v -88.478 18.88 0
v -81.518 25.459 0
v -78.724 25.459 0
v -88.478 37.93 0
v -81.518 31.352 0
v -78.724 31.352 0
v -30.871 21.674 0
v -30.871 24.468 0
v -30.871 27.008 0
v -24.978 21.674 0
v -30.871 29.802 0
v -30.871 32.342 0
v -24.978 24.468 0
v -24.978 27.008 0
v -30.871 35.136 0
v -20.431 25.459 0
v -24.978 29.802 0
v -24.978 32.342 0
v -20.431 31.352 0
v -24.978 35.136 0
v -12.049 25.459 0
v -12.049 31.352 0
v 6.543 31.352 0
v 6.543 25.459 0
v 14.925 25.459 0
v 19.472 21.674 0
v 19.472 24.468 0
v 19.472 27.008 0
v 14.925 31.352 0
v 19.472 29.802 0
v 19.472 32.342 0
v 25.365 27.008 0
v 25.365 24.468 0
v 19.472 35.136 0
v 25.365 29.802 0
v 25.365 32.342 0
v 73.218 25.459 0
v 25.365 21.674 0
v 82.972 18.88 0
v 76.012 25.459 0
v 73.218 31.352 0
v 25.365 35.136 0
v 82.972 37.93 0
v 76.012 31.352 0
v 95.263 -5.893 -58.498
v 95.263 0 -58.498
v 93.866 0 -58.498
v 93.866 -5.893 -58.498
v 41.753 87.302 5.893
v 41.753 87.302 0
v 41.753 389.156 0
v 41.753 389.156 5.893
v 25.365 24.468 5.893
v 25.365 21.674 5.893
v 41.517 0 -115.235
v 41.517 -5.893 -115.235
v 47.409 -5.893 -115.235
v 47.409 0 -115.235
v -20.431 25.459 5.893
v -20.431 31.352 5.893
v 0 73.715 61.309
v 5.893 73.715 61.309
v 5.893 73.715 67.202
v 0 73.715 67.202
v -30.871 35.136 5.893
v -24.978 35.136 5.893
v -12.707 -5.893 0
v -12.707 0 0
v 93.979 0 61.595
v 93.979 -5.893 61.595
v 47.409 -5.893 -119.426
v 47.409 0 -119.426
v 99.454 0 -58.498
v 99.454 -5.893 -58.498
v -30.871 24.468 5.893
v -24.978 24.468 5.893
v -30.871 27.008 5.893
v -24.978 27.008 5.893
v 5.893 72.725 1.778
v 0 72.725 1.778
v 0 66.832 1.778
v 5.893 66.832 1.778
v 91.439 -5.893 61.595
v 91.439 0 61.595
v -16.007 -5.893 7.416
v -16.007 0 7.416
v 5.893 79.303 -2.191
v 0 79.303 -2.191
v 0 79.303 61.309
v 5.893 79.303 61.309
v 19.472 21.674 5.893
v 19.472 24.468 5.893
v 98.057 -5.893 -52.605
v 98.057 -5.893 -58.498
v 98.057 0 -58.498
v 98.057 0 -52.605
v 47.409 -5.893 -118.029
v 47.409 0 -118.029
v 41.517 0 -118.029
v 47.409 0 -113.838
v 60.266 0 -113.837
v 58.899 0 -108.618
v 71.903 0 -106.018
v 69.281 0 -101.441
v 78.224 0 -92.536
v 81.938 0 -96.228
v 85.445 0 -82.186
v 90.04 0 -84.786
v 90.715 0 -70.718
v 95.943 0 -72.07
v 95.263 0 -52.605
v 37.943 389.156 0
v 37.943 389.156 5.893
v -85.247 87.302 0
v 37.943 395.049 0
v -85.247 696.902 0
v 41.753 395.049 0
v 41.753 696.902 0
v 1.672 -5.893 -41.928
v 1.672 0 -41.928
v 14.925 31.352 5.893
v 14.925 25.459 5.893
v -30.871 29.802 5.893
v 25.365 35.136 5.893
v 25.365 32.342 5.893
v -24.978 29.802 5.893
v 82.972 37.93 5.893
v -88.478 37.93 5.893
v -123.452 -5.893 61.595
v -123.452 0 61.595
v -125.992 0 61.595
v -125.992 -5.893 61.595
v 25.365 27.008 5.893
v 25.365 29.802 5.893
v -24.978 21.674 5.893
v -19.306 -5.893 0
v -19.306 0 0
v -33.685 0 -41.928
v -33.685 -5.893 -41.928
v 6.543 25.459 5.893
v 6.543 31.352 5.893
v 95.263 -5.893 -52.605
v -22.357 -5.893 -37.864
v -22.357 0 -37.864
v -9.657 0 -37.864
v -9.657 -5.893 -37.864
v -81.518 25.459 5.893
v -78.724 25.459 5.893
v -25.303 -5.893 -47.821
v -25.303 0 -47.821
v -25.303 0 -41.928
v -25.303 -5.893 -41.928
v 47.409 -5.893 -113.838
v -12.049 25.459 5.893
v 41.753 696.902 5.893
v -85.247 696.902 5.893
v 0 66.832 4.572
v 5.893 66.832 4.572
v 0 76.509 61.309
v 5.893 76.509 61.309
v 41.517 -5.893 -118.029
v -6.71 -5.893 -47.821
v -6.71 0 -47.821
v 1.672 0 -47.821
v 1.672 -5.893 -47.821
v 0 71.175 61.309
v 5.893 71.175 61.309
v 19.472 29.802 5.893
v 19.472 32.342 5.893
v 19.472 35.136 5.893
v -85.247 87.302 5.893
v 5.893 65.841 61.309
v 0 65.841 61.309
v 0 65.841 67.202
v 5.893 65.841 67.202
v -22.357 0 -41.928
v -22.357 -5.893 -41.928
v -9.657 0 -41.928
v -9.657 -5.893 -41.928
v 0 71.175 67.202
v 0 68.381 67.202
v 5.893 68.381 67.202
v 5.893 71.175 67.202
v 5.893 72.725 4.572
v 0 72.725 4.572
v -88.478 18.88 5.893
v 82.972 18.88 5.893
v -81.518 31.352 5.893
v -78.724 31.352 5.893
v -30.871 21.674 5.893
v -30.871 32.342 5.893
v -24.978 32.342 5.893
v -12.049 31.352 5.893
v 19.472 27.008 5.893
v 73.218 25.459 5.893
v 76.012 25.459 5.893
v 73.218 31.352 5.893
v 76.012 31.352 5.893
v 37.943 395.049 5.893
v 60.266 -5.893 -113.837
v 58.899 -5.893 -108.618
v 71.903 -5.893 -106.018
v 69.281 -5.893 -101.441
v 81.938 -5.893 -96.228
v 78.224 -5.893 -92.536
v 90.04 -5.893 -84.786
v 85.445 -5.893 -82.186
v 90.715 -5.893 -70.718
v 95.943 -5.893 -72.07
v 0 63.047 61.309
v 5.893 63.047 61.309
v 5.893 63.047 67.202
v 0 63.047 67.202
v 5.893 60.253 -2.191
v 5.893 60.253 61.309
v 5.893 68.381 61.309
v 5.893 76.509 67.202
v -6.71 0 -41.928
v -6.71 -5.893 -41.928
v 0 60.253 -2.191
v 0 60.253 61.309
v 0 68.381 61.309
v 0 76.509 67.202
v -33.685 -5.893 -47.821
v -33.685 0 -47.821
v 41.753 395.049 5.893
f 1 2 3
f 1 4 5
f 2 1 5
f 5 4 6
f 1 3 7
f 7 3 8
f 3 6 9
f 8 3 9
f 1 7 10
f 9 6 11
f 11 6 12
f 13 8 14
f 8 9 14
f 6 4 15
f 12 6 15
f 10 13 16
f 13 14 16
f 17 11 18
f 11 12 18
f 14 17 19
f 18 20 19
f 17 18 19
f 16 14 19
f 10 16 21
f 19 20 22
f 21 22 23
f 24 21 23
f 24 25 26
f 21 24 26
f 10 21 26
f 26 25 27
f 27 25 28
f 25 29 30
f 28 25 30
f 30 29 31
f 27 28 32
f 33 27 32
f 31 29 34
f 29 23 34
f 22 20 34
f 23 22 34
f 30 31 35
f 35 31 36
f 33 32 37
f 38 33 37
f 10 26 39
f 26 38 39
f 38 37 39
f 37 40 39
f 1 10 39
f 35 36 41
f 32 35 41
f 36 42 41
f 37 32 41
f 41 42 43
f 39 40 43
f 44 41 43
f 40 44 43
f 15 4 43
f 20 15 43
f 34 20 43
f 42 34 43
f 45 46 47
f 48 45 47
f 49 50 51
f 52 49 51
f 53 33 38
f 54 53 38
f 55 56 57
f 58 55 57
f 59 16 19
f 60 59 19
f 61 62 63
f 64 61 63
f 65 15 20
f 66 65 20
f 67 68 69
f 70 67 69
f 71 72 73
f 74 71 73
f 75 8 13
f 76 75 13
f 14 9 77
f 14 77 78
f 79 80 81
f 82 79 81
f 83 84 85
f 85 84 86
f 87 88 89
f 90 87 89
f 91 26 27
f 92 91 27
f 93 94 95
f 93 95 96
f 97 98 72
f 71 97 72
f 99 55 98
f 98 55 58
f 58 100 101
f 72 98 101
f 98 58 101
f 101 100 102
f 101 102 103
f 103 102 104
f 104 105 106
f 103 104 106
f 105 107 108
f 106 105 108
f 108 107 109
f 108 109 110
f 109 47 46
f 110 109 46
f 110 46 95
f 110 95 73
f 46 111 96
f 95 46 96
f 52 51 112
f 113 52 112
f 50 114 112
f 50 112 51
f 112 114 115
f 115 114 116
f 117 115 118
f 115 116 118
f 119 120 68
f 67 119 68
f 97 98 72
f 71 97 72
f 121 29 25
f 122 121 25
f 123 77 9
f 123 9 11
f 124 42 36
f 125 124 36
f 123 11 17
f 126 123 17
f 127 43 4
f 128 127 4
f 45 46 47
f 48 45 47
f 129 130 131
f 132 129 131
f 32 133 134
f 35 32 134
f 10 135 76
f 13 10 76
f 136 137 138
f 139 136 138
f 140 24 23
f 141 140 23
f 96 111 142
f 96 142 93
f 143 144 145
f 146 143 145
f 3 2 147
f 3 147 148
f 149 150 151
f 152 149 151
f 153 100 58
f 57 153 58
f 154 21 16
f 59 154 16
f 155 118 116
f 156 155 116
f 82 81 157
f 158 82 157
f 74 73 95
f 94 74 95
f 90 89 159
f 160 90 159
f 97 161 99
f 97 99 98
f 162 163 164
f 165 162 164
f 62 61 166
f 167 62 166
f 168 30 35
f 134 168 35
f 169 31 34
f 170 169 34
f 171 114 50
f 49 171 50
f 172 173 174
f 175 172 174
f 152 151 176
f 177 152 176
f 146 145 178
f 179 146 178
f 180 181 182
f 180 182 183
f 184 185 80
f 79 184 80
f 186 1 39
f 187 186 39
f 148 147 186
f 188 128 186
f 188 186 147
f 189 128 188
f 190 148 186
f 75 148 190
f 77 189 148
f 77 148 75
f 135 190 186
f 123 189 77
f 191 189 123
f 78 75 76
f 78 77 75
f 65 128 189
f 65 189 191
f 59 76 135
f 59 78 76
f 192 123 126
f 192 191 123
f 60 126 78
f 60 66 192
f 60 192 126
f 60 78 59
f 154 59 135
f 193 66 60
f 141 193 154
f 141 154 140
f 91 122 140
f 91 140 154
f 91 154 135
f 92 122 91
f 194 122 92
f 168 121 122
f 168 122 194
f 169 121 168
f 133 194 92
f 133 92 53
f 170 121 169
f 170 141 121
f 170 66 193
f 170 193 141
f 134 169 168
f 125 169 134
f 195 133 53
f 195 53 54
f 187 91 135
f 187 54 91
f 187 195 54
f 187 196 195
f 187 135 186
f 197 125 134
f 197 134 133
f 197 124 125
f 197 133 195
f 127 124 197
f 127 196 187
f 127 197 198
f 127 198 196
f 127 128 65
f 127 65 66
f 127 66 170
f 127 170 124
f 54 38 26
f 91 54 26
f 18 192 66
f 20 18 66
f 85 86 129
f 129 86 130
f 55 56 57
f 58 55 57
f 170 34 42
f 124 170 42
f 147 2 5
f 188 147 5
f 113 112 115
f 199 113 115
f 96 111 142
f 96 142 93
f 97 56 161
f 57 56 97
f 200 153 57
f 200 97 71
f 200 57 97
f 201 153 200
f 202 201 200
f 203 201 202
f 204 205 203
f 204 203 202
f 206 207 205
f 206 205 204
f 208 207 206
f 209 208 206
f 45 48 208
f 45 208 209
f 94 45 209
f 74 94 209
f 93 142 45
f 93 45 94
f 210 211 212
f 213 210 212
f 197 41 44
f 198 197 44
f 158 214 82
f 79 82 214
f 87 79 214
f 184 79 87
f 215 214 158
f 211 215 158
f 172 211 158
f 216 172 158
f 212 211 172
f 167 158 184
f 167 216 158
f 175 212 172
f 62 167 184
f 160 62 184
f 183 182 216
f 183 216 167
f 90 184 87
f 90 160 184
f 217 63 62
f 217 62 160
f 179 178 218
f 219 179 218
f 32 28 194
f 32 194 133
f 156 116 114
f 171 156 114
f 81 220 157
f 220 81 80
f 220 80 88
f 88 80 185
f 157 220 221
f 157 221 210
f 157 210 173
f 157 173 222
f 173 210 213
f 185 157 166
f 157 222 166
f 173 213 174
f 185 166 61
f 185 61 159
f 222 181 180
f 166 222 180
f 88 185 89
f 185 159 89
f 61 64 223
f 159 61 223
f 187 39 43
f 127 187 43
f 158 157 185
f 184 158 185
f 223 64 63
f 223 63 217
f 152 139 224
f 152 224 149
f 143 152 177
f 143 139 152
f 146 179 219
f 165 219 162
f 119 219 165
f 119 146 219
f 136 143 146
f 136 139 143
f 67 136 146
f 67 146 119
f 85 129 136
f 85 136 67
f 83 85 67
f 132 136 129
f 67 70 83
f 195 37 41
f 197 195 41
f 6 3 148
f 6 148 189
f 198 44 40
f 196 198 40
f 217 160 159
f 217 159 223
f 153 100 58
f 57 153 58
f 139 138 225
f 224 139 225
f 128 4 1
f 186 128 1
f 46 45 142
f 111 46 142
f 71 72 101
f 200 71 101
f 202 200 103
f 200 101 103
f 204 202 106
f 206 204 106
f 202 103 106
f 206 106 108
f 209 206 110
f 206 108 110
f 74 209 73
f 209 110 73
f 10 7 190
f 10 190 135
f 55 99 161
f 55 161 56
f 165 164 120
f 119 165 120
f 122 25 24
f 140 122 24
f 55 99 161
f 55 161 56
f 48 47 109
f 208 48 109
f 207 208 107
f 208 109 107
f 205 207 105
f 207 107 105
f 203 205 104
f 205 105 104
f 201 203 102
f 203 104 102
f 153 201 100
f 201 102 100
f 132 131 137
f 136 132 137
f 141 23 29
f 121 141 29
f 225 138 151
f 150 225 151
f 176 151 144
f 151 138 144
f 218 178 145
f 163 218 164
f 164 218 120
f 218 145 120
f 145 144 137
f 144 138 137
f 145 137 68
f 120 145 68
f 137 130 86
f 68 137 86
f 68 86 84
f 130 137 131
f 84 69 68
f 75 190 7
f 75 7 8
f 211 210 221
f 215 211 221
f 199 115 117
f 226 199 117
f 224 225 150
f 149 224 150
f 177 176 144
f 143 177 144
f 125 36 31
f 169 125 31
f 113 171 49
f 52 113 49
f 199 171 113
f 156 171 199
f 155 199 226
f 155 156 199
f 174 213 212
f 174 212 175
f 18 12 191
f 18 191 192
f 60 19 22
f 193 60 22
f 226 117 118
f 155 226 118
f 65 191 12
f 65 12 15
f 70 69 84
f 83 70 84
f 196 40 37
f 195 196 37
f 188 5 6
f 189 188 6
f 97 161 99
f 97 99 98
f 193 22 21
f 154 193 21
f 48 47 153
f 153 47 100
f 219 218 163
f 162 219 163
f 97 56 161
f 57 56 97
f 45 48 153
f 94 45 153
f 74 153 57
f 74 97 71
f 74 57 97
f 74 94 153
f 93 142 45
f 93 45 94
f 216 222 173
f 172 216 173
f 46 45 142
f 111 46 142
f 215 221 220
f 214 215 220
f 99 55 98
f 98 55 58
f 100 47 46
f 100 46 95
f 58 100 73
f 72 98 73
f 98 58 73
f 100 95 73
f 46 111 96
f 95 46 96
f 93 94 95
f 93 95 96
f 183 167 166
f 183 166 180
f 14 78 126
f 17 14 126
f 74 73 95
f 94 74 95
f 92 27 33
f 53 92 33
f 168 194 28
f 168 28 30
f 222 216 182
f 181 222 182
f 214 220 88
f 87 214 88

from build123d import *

# Parameters (mm, degrees)
F1_W      = 5.8928
F1_H      = 2.794
F1_W_2    = 2.794
F1_H_2    = 5.8928
F2_DEPTH  = 5.8928
F3_W      = 2.794
F3_H      = 12.9595901101
F3_W_2    = 2.54
F3_H_2    = 5.8928
F4_DEPTH  = 5.8928
F5_W      = 2.794
F5_H      = 5.8928
F5_W_2    = 5.8928
F5_H_2    = 2.794
F6_DEPTH  = 5.8928
F7_W      = 2.794
F7_H      = 5.8928
F7_W_2    = 5.8928
F7_H_2    = 2.794
F8_DEPTH  = 5.8928
F10_DEPTH = 5.8928
F13_DEPTH = 5.8928


# Not quite as in the source:
# - a variable given as a bare number and used for a length is read in inches; the dataset says mm whatever the document's units were


with BuildPart() as f2:
    # F1 (on Top) → F2 (new body)
    with BuildSketch(Plane.XY):
        Polygon((22.4183307789, 37.9304943726), (10.7343307789, 37.9304943726), (10.7343307789, 31.3518943726), (14.9253307789, 31.3518943726), (14.9253307789, 25.4590943726), (10.7343307789, 25.4590943726), (10.7343307789, 18.8804943726), (22.4183307789, 18.8804943726), (74.6153307789, 18.8804943726), (74.6153307789, 25.4590943726), (73.2183307789, 25.4590943726), (73.2183307789, 31.3518943726), (74.6153307789, 31.3518943726), (74.6153307789, 37.9304943726), align=None)
        Polygon((25.3647307789, 21.6744943726), (22.4183307789, 21.6744943726), (19.4719307789, 21.6744943726), (19.4719307789, 24.4684943726), (25.3647307789, 24.4684943726), align=None, mode=Mode.SUBTRACT)
        with Locations((22.4183307789, 28.4054943726)):
            Rectangle(F1_W, F1_H, mode=Mode.SUBTRACT)
        Polygon((19.4719307789, 35.1364943726), (22.4183307789, 35.1364943726), (25.3647307789, 35.1364943726), (25.3647307789, 32.3424943726), (19.4719307789, 32.3424943726), align=None, mode=Mode.SUBTRACT)
        Polygon((-2.7530692211, 37.9304943726), (-88.4780692211, 37.9304943726), (-88.4780692211, 18.8804943726), (-2.7530692211, 18.8804943726), (-2.7530692211, 28.4054943726), align=None)
        with Locations((-27.9244692211, 23.0714943726)):
            Rectangle(F1_W, F1_H, mode=Mode.SUBTRACT)
        with Locations((-80.1214692211, 28.4054943726)):
            Rectangle(F1_W_2, F1_H_2, mode=Mode.SUBTRACT)
        with Locations((-27.9244692211, 28.4054943726)):
            Rectangle(F1_W, F1_H, mode=Mode.SUBTRACT)
        Polygon((-12.0494692211, 31.3518943726), (-12.0494692211, 28.4054943726), (-12.0494692211, 25.4590943726), (-20.4314692211, 25.4590943726), (-20.4314692211, 31.3518943726), align=None, mode=Mode.SUBTRACT)
        with Locations((-27.9244692211, 33.7394943726)):
            Rectangle(F1_W, F1_H, mode=Mode.SUBTRACT)
        Polygon((82.9719307789, 37.9304943726), (74.6153307789, 37.9304943726), (74.6153307789, 31.3518943726), (76.0123307789, 31.3518943726), (76.0123307789, 25.4590943726), (74.6153307789, 25.4590943726), (74.6153307789, 18.8804943726), (82.9719307789, 18.8804943726), align=None)
        Polygon((10.7343307789, 37.9304943726), (-2.7530692211, 37.9304943726), (-2.7530692211, 28.4054943726), (6.5433307789, 28.4054943726), (6.5433307789, 31.3518943726), (10.7343307789, 31.3518943726), align=None)
        Polygon((6.5433307789, 28.4054943726), (-2.7530692211, 28.4054943726), (-2.7530692211, 18.8804943726), (10.7343307789, 18.8804943726), (10.7343307789, 25.4590943726), (6.5433307789, 25.4590943726), align=None)
    extrude(amount=F2_DEPTH)


with BuildPart() as f4:
    # F3 (on Right) → F4 (new body)
    with BuildSketch(Plane.YZ):
        Polygon((60.25341, -2.19075), (79.30341, -2.19075), (79.30341, 4.572), (72.72481, 4.572), (72.72481, 1.778), (66.83201, 1.778), (66.83201, 4.572), (60.25341, 4.572), align=None)
        Polygon((72.72481, 4.572), (79.30341, 4.572), (79.30341, 48.3496598899), (76.50941, 48.3496598899), (73.71541, 48.3496598899), (71.17541, 48.3496598899), (68.38141, 48.3496598899), (65.84141, 48.3496598899), (63.04741, 48.3496598899), (60.25341, 48.3496598899), (60.25341, 4.572), (66.83201, 4.572), align=None)
        Polygon((76.50941, 48.3496598899), (79.30341, 48.3496598899), (79.30341, 54.61), (79.30341, 61.30925), (76.50941, 61.30925), align=None)
        with Locations((61.65041, 54.829454945)):
            Rectangle(F3_W, F3_H)
        with Locations((75.11241, 54.829454945)):
            Rectangle(F3_W, F3_H)
        with Locations((64.44441, 54.829454945)):
            Rectangle(F3_W, F3_H)
        with Locations((72.44541, 54.829454945)):
            Rectangle(F3_W_2, F3_H)
        with Locations((75.11241, 64.25565)):
            Rectangle(F3_W, F3_H_2)
        with Locations((64.44441, 64.25565)):
            Rectangle(F3_W, F3_H_2)
        with Locations((67.11141, 54.829454945)):
            Rectangle(F3_W_2, F3_H)
        with Locations((69.77841, 54.829454945)):
            Rectangle(F3_W, F3_H)
        with Locations((69.77841, 64.25565)):
            Rectangle(F3_W, F3_H_2)
    extrude(amount=F4_DEPTH)


with BuildPart() as f6:
    # F5 (on Front) → F6 (new body)
    with BuildSketch(Plane.XZ):
        with BuildLine():
            Line((95.2629311906, -58.4977063152), (93.8659311906, -58.4977063152))
            ThreePointArc((93.8659311906, -58.4977063152), (78.2238370796, -92.5362400683), (47.4093311906, -113.8379563152))
            Line((47.4093311906, -113.8379563152), (47.4093311906, -115.2349563152))
            Line((47.4093311906, -115.2349563152), (47.4093311906, -118.0289563152))
            Line((47.4093311906, -118.0289563152), (47.4093311906, -119.4259563152))
            ThreePointArc((47.4093311906, -119.4259563152), (81.937577657, -96.2275673485), (99.4539311906, -58.4977063152))
            Line((99.4539311906, -58.4977063152), (98.0569311906, -58.4977063152))
            Line((98.0569311906, -58.4977063152), (95.2629311906, -58.4977063152))
        make_face()
        with Locations((96.6599311906, -55.5513063152)):
            Rectangle(F5_W, F5_H)
        with Locations((44.4629311906, -116.6319563152)):
            Rectangle(F5_W_2, F5_H_2)
    extrude(amount=F6_DEPTH)


with BuildPart() as f8:
    # F7 (on Front) → F8 (new body)
    with BuildSketch(Plane.XZ):
        Polygon((98.0569311906, -58.4977063152), (95.2629311906, -58.4977063152), (93.8659311906, -58.4977063152), (47.4093311906, -113.8379563152), (47.4093311906, -115.2349563152), (47.4093311906, -118.0289563152), (47.4093311906, -119.4259563152), (99.4539311906, -58.4977063152), align=None)
        with Locations((96.6599311906, -55.5513063152)):
            Rectangle(F7_W, F7_H)
        with Locations((44.4629311906, -116.6319563152)):
            Rectangle(F7_W_2, F7_H_2)
    extrude(amount=F8_DEPTH)


with BuildPart() as f10:
    # F9 (on Front) → F10 (new body)
    with BuildSketch(Plane.XZ):
        Polygon((-123.4517790751, 61.595), (-125.9917790751, 61.595), (-19.3061095829, 0), (-16.0065527945, 0), (-16.0065527945, 7.4160954057), align=None)
        Polygon((-16.0065527945, -1.905), (-19.3061095829, 0), (-33.6849527945, -41.9280635703), (-33.6849527945, -47.8208635703), (-25.3029527945, -47.8208635703), (-25.3029527945, -41.9280635703), (-22.3565527945, -41.9280635703), (-22.3565527945, -37.8640635703), (-16.0065527945, -37.8640635703), align=None)
        Polygon((-16.0065527945, 0), (-19.3061095829, 0), (-16.0065527945, -1.905), align=None)
        Polygon((91.4386734861, 61.595), (-16.0065527945, 7.4160954057), (-16.0065527945, 0), (-12.7069960061, 0), (93.9786734861, 61.595), align=None)
        Polygon((-12.7069960061, 0), (-16.0065527945, 0), (-16.0065527945, -1.905), align=None)
        Polygon((-12.7069960061, 0), (-16.0065527945, -1.905), (-16.0065527945, -37.8640635703), (-9.6565527945, -37.8640635703), (-9.6565527945, -41.9280635703), (-6.7101527945, -41.9280635703), (-6.7101527945, -47.8208635703), (1.6718472055, -47.8208635703), (1.6718472055, -41.9280635703), align=None)
    extrude(amount=F10_DEPTH)


with BuildPart() as f13:
    # F12 (on Top) → F13 (new body)
    with BuildSketch(Plane.XY):
        Polygon((41.7525291319, 696.9023720026), (-85.2474708681, 696.9023720026), (-85.2474708681, 87.3023720026), (41.7525291319, 87.3023720026), (41.7525291319, 389.1559720026), (37.9425291319, 389.1559720026), (37.9425291319, 395.0487720026), (41.7525291319, 395.0487720026), align=None)
    extrude(amount=F13_DEPTH)


solid = Compound([f2.part, f4.part, f6.part, f8.part, f10.part, f13.part])
